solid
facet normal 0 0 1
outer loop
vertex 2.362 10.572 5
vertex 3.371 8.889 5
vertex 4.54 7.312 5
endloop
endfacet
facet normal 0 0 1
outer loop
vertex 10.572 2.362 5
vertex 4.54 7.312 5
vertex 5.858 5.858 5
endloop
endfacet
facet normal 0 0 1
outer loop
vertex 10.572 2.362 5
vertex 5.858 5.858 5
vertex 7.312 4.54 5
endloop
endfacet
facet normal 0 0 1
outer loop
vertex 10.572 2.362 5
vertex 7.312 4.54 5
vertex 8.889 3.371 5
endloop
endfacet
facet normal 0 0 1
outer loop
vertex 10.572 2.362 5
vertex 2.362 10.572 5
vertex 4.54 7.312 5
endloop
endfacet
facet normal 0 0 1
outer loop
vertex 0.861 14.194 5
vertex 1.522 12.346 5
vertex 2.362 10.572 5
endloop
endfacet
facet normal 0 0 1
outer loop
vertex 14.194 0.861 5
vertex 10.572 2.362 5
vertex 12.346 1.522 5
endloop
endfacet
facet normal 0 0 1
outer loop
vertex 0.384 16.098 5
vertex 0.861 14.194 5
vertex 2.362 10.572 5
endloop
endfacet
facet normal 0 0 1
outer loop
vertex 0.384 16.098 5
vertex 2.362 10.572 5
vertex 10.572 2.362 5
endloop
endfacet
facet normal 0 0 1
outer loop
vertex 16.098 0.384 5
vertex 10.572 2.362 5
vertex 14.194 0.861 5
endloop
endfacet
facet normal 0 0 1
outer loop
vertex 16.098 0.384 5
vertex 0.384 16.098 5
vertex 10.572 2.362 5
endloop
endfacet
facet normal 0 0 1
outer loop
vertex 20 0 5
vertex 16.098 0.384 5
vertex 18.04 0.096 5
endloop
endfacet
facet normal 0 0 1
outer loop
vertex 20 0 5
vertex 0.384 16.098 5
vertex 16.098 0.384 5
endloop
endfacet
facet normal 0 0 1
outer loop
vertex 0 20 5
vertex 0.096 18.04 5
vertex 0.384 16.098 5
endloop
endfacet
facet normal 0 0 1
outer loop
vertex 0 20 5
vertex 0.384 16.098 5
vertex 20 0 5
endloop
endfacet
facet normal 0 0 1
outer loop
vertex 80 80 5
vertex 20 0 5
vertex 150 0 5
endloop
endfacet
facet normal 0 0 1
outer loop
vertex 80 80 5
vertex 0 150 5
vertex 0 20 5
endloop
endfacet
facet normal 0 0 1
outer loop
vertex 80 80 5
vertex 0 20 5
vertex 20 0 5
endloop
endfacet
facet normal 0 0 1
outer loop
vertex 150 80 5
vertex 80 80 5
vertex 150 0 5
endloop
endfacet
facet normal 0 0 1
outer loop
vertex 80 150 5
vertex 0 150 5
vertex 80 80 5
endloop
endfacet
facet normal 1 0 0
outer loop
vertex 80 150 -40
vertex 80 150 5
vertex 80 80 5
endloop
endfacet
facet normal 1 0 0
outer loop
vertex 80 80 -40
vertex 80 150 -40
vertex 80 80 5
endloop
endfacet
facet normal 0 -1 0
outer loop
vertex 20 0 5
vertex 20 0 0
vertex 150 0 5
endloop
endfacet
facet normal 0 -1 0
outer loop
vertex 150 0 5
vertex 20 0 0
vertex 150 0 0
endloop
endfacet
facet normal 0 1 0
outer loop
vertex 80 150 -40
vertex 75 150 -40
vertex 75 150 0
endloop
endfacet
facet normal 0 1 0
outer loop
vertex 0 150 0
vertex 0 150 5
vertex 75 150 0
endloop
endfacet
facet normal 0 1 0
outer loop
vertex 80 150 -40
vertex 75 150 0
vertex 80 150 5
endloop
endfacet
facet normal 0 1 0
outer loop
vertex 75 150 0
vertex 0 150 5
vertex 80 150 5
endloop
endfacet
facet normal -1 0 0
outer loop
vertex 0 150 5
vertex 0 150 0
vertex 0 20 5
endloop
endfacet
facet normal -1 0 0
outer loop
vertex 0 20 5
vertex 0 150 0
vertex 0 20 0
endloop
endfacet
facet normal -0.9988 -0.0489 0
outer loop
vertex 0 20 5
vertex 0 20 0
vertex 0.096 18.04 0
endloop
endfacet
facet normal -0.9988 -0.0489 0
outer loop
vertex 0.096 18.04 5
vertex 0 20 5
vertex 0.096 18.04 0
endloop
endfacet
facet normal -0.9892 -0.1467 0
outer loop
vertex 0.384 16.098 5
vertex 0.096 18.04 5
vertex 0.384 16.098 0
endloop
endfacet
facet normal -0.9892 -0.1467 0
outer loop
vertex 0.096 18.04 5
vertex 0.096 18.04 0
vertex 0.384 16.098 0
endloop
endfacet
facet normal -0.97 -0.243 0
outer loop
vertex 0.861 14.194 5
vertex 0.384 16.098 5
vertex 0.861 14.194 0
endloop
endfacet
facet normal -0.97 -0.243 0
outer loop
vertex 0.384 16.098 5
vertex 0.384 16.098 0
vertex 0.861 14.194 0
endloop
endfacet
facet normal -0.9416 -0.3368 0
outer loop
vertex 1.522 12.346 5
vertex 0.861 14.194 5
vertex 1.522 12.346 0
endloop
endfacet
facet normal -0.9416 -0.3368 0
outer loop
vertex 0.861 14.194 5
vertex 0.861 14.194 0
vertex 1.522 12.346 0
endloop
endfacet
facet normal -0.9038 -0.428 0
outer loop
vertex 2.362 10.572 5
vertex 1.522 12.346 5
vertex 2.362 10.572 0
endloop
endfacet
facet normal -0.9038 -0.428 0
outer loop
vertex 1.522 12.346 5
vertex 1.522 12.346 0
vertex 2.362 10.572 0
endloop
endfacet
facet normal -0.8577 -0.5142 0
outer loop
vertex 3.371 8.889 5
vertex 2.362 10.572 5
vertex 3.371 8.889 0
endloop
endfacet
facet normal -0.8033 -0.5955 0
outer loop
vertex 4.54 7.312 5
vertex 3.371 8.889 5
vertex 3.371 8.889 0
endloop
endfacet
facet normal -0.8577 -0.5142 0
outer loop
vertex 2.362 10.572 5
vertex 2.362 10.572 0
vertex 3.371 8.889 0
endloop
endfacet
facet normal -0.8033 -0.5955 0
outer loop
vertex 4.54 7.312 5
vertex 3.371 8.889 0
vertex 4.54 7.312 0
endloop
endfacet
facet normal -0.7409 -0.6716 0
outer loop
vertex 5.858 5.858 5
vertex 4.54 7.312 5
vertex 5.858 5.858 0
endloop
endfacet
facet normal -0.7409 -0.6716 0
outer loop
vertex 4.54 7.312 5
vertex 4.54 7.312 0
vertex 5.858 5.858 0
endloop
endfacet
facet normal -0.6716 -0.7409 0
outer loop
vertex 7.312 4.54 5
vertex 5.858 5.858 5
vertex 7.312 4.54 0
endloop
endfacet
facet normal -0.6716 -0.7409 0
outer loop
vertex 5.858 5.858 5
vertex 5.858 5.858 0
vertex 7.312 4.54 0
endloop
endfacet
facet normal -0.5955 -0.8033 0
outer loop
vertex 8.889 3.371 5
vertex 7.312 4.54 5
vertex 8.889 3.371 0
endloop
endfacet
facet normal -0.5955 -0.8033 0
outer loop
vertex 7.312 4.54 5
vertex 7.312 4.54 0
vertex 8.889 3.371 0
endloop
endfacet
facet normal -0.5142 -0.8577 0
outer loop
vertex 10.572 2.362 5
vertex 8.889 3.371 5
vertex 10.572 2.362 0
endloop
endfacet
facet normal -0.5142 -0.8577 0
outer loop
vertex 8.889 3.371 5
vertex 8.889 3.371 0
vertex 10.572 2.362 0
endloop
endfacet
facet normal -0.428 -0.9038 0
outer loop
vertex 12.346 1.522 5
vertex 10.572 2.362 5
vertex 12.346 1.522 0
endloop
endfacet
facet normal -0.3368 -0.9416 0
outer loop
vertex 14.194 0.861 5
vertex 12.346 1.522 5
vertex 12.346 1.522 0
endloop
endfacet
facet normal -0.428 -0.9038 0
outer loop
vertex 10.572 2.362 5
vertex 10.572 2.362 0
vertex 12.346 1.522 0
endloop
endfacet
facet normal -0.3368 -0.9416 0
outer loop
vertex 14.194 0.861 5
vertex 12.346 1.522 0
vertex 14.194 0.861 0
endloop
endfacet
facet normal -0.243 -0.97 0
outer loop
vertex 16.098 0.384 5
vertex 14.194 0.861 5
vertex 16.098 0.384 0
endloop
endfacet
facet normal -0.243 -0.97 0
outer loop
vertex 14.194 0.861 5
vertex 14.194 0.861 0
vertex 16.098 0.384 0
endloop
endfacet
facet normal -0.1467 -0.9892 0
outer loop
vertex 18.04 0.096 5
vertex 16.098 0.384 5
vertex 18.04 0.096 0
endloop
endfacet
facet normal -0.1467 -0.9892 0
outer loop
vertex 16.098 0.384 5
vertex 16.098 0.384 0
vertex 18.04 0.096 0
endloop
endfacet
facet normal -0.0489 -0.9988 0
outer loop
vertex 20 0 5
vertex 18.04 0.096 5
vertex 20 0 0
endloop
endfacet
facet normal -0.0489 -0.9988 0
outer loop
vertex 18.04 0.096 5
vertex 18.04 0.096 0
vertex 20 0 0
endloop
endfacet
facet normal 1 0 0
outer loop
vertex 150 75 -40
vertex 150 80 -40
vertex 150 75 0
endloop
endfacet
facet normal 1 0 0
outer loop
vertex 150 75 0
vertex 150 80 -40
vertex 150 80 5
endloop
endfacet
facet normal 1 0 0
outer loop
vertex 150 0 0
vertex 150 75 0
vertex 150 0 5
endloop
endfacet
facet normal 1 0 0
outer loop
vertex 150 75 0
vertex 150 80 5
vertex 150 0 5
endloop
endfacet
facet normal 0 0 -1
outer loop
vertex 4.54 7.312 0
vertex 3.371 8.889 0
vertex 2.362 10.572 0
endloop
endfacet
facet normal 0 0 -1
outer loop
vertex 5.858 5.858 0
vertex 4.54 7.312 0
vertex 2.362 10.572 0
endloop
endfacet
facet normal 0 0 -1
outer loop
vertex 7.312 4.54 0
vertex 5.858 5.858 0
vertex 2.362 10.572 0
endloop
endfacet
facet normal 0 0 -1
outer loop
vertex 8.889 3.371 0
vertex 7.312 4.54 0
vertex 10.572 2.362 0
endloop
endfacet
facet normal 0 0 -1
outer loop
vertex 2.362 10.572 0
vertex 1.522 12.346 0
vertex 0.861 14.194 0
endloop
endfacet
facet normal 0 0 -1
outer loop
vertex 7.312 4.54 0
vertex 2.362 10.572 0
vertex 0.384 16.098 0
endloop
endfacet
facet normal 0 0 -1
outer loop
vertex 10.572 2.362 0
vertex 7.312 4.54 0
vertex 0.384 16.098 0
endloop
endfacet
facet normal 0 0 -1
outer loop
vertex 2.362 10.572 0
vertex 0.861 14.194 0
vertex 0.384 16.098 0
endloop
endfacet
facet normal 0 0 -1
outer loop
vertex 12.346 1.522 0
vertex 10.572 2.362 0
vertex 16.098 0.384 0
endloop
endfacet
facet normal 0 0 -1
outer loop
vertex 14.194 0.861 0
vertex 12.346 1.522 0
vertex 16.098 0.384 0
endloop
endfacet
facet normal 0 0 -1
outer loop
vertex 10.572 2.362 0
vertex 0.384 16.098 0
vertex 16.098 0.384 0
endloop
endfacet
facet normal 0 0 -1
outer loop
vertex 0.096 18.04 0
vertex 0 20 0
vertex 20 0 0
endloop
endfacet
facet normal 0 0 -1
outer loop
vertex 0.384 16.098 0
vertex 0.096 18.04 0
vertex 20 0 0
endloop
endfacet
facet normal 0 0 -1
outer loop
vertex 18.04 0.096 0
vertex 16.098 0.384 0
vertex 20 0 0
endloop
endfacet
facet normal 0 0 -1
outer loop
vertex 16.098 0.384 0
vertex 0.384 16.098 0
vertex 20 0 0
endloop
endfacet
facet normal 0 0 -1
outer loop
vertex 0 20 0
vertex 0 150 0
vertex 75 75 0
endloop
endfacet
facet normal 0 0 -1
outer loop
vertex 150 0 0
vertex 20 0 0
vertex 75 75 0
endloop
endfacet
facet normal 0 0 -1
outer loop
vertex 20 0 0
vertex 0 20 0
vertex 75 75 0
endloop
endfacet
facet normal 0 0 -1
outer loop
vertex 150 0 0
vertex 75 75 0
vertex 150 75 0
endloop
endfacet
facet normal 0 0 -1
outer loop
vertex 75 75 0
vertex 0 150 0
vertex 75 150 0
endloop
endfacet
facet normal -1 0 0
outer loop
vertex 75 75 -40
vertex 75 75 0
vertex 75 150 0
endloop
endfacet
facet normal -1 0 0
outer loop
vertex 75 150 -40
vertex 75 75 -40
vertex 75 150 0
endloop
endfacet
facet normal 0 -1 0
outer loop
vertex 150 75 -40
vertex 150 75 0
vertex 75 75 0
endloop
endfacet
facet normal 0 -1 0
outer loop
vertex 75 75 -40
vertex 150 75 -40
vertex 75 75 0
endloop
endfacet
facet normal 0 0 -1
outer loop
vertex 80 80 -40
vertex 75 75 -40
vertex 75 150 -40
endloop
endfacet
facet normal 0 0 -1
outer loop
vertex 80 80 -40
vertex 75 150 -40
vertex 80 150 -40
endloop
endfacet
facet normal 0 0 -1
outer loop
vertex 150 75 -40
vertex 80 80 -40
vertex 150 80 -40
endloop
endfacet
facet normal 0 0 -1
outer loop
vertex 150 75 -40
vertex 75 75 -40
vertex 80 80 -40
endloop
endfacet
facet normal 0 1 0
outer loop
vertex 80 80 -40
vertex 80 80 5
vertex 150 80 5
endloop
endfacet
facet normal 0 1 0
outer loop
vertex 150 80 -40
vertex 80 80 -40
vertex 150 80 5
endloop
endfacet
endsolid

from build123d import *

# Parameters (mm, degrees)
F1_DEPTH = 5
F3_DEPTH = 40


with BuildPart() as f1:
    # F0 (on Top) → F1 (new body)
    with BuildSketch(Plane.XY):
        with BuildLine():
            ThreePointArc((0, 20), (5.857864, 5.857864), (20, 0))
            Line((20, 0), (150, 0))
            Line((150, 0), (150, 80))
            Line((150, 80), (80, 80))
            Line((80, 80), (80, 150))
            Line((80, 150), (0, 150))
            Line((0, 150), (0, 20))
        make_face()
    extrude(amount=F1_DEPTH)

    # F2 (on face) → F3 (join)
    with BuildSketch(Plane(origin=(0, 0, 0), x_dir=(1, 0, 0), z_dir=(0, 0, -1))):
        Polygon((80, -80), (150, -80), (150, -75), (75, -75), (75, -150), (80, -150), align=None)
    extrude(amount=F3_DEPTH)


solid = f1.part
